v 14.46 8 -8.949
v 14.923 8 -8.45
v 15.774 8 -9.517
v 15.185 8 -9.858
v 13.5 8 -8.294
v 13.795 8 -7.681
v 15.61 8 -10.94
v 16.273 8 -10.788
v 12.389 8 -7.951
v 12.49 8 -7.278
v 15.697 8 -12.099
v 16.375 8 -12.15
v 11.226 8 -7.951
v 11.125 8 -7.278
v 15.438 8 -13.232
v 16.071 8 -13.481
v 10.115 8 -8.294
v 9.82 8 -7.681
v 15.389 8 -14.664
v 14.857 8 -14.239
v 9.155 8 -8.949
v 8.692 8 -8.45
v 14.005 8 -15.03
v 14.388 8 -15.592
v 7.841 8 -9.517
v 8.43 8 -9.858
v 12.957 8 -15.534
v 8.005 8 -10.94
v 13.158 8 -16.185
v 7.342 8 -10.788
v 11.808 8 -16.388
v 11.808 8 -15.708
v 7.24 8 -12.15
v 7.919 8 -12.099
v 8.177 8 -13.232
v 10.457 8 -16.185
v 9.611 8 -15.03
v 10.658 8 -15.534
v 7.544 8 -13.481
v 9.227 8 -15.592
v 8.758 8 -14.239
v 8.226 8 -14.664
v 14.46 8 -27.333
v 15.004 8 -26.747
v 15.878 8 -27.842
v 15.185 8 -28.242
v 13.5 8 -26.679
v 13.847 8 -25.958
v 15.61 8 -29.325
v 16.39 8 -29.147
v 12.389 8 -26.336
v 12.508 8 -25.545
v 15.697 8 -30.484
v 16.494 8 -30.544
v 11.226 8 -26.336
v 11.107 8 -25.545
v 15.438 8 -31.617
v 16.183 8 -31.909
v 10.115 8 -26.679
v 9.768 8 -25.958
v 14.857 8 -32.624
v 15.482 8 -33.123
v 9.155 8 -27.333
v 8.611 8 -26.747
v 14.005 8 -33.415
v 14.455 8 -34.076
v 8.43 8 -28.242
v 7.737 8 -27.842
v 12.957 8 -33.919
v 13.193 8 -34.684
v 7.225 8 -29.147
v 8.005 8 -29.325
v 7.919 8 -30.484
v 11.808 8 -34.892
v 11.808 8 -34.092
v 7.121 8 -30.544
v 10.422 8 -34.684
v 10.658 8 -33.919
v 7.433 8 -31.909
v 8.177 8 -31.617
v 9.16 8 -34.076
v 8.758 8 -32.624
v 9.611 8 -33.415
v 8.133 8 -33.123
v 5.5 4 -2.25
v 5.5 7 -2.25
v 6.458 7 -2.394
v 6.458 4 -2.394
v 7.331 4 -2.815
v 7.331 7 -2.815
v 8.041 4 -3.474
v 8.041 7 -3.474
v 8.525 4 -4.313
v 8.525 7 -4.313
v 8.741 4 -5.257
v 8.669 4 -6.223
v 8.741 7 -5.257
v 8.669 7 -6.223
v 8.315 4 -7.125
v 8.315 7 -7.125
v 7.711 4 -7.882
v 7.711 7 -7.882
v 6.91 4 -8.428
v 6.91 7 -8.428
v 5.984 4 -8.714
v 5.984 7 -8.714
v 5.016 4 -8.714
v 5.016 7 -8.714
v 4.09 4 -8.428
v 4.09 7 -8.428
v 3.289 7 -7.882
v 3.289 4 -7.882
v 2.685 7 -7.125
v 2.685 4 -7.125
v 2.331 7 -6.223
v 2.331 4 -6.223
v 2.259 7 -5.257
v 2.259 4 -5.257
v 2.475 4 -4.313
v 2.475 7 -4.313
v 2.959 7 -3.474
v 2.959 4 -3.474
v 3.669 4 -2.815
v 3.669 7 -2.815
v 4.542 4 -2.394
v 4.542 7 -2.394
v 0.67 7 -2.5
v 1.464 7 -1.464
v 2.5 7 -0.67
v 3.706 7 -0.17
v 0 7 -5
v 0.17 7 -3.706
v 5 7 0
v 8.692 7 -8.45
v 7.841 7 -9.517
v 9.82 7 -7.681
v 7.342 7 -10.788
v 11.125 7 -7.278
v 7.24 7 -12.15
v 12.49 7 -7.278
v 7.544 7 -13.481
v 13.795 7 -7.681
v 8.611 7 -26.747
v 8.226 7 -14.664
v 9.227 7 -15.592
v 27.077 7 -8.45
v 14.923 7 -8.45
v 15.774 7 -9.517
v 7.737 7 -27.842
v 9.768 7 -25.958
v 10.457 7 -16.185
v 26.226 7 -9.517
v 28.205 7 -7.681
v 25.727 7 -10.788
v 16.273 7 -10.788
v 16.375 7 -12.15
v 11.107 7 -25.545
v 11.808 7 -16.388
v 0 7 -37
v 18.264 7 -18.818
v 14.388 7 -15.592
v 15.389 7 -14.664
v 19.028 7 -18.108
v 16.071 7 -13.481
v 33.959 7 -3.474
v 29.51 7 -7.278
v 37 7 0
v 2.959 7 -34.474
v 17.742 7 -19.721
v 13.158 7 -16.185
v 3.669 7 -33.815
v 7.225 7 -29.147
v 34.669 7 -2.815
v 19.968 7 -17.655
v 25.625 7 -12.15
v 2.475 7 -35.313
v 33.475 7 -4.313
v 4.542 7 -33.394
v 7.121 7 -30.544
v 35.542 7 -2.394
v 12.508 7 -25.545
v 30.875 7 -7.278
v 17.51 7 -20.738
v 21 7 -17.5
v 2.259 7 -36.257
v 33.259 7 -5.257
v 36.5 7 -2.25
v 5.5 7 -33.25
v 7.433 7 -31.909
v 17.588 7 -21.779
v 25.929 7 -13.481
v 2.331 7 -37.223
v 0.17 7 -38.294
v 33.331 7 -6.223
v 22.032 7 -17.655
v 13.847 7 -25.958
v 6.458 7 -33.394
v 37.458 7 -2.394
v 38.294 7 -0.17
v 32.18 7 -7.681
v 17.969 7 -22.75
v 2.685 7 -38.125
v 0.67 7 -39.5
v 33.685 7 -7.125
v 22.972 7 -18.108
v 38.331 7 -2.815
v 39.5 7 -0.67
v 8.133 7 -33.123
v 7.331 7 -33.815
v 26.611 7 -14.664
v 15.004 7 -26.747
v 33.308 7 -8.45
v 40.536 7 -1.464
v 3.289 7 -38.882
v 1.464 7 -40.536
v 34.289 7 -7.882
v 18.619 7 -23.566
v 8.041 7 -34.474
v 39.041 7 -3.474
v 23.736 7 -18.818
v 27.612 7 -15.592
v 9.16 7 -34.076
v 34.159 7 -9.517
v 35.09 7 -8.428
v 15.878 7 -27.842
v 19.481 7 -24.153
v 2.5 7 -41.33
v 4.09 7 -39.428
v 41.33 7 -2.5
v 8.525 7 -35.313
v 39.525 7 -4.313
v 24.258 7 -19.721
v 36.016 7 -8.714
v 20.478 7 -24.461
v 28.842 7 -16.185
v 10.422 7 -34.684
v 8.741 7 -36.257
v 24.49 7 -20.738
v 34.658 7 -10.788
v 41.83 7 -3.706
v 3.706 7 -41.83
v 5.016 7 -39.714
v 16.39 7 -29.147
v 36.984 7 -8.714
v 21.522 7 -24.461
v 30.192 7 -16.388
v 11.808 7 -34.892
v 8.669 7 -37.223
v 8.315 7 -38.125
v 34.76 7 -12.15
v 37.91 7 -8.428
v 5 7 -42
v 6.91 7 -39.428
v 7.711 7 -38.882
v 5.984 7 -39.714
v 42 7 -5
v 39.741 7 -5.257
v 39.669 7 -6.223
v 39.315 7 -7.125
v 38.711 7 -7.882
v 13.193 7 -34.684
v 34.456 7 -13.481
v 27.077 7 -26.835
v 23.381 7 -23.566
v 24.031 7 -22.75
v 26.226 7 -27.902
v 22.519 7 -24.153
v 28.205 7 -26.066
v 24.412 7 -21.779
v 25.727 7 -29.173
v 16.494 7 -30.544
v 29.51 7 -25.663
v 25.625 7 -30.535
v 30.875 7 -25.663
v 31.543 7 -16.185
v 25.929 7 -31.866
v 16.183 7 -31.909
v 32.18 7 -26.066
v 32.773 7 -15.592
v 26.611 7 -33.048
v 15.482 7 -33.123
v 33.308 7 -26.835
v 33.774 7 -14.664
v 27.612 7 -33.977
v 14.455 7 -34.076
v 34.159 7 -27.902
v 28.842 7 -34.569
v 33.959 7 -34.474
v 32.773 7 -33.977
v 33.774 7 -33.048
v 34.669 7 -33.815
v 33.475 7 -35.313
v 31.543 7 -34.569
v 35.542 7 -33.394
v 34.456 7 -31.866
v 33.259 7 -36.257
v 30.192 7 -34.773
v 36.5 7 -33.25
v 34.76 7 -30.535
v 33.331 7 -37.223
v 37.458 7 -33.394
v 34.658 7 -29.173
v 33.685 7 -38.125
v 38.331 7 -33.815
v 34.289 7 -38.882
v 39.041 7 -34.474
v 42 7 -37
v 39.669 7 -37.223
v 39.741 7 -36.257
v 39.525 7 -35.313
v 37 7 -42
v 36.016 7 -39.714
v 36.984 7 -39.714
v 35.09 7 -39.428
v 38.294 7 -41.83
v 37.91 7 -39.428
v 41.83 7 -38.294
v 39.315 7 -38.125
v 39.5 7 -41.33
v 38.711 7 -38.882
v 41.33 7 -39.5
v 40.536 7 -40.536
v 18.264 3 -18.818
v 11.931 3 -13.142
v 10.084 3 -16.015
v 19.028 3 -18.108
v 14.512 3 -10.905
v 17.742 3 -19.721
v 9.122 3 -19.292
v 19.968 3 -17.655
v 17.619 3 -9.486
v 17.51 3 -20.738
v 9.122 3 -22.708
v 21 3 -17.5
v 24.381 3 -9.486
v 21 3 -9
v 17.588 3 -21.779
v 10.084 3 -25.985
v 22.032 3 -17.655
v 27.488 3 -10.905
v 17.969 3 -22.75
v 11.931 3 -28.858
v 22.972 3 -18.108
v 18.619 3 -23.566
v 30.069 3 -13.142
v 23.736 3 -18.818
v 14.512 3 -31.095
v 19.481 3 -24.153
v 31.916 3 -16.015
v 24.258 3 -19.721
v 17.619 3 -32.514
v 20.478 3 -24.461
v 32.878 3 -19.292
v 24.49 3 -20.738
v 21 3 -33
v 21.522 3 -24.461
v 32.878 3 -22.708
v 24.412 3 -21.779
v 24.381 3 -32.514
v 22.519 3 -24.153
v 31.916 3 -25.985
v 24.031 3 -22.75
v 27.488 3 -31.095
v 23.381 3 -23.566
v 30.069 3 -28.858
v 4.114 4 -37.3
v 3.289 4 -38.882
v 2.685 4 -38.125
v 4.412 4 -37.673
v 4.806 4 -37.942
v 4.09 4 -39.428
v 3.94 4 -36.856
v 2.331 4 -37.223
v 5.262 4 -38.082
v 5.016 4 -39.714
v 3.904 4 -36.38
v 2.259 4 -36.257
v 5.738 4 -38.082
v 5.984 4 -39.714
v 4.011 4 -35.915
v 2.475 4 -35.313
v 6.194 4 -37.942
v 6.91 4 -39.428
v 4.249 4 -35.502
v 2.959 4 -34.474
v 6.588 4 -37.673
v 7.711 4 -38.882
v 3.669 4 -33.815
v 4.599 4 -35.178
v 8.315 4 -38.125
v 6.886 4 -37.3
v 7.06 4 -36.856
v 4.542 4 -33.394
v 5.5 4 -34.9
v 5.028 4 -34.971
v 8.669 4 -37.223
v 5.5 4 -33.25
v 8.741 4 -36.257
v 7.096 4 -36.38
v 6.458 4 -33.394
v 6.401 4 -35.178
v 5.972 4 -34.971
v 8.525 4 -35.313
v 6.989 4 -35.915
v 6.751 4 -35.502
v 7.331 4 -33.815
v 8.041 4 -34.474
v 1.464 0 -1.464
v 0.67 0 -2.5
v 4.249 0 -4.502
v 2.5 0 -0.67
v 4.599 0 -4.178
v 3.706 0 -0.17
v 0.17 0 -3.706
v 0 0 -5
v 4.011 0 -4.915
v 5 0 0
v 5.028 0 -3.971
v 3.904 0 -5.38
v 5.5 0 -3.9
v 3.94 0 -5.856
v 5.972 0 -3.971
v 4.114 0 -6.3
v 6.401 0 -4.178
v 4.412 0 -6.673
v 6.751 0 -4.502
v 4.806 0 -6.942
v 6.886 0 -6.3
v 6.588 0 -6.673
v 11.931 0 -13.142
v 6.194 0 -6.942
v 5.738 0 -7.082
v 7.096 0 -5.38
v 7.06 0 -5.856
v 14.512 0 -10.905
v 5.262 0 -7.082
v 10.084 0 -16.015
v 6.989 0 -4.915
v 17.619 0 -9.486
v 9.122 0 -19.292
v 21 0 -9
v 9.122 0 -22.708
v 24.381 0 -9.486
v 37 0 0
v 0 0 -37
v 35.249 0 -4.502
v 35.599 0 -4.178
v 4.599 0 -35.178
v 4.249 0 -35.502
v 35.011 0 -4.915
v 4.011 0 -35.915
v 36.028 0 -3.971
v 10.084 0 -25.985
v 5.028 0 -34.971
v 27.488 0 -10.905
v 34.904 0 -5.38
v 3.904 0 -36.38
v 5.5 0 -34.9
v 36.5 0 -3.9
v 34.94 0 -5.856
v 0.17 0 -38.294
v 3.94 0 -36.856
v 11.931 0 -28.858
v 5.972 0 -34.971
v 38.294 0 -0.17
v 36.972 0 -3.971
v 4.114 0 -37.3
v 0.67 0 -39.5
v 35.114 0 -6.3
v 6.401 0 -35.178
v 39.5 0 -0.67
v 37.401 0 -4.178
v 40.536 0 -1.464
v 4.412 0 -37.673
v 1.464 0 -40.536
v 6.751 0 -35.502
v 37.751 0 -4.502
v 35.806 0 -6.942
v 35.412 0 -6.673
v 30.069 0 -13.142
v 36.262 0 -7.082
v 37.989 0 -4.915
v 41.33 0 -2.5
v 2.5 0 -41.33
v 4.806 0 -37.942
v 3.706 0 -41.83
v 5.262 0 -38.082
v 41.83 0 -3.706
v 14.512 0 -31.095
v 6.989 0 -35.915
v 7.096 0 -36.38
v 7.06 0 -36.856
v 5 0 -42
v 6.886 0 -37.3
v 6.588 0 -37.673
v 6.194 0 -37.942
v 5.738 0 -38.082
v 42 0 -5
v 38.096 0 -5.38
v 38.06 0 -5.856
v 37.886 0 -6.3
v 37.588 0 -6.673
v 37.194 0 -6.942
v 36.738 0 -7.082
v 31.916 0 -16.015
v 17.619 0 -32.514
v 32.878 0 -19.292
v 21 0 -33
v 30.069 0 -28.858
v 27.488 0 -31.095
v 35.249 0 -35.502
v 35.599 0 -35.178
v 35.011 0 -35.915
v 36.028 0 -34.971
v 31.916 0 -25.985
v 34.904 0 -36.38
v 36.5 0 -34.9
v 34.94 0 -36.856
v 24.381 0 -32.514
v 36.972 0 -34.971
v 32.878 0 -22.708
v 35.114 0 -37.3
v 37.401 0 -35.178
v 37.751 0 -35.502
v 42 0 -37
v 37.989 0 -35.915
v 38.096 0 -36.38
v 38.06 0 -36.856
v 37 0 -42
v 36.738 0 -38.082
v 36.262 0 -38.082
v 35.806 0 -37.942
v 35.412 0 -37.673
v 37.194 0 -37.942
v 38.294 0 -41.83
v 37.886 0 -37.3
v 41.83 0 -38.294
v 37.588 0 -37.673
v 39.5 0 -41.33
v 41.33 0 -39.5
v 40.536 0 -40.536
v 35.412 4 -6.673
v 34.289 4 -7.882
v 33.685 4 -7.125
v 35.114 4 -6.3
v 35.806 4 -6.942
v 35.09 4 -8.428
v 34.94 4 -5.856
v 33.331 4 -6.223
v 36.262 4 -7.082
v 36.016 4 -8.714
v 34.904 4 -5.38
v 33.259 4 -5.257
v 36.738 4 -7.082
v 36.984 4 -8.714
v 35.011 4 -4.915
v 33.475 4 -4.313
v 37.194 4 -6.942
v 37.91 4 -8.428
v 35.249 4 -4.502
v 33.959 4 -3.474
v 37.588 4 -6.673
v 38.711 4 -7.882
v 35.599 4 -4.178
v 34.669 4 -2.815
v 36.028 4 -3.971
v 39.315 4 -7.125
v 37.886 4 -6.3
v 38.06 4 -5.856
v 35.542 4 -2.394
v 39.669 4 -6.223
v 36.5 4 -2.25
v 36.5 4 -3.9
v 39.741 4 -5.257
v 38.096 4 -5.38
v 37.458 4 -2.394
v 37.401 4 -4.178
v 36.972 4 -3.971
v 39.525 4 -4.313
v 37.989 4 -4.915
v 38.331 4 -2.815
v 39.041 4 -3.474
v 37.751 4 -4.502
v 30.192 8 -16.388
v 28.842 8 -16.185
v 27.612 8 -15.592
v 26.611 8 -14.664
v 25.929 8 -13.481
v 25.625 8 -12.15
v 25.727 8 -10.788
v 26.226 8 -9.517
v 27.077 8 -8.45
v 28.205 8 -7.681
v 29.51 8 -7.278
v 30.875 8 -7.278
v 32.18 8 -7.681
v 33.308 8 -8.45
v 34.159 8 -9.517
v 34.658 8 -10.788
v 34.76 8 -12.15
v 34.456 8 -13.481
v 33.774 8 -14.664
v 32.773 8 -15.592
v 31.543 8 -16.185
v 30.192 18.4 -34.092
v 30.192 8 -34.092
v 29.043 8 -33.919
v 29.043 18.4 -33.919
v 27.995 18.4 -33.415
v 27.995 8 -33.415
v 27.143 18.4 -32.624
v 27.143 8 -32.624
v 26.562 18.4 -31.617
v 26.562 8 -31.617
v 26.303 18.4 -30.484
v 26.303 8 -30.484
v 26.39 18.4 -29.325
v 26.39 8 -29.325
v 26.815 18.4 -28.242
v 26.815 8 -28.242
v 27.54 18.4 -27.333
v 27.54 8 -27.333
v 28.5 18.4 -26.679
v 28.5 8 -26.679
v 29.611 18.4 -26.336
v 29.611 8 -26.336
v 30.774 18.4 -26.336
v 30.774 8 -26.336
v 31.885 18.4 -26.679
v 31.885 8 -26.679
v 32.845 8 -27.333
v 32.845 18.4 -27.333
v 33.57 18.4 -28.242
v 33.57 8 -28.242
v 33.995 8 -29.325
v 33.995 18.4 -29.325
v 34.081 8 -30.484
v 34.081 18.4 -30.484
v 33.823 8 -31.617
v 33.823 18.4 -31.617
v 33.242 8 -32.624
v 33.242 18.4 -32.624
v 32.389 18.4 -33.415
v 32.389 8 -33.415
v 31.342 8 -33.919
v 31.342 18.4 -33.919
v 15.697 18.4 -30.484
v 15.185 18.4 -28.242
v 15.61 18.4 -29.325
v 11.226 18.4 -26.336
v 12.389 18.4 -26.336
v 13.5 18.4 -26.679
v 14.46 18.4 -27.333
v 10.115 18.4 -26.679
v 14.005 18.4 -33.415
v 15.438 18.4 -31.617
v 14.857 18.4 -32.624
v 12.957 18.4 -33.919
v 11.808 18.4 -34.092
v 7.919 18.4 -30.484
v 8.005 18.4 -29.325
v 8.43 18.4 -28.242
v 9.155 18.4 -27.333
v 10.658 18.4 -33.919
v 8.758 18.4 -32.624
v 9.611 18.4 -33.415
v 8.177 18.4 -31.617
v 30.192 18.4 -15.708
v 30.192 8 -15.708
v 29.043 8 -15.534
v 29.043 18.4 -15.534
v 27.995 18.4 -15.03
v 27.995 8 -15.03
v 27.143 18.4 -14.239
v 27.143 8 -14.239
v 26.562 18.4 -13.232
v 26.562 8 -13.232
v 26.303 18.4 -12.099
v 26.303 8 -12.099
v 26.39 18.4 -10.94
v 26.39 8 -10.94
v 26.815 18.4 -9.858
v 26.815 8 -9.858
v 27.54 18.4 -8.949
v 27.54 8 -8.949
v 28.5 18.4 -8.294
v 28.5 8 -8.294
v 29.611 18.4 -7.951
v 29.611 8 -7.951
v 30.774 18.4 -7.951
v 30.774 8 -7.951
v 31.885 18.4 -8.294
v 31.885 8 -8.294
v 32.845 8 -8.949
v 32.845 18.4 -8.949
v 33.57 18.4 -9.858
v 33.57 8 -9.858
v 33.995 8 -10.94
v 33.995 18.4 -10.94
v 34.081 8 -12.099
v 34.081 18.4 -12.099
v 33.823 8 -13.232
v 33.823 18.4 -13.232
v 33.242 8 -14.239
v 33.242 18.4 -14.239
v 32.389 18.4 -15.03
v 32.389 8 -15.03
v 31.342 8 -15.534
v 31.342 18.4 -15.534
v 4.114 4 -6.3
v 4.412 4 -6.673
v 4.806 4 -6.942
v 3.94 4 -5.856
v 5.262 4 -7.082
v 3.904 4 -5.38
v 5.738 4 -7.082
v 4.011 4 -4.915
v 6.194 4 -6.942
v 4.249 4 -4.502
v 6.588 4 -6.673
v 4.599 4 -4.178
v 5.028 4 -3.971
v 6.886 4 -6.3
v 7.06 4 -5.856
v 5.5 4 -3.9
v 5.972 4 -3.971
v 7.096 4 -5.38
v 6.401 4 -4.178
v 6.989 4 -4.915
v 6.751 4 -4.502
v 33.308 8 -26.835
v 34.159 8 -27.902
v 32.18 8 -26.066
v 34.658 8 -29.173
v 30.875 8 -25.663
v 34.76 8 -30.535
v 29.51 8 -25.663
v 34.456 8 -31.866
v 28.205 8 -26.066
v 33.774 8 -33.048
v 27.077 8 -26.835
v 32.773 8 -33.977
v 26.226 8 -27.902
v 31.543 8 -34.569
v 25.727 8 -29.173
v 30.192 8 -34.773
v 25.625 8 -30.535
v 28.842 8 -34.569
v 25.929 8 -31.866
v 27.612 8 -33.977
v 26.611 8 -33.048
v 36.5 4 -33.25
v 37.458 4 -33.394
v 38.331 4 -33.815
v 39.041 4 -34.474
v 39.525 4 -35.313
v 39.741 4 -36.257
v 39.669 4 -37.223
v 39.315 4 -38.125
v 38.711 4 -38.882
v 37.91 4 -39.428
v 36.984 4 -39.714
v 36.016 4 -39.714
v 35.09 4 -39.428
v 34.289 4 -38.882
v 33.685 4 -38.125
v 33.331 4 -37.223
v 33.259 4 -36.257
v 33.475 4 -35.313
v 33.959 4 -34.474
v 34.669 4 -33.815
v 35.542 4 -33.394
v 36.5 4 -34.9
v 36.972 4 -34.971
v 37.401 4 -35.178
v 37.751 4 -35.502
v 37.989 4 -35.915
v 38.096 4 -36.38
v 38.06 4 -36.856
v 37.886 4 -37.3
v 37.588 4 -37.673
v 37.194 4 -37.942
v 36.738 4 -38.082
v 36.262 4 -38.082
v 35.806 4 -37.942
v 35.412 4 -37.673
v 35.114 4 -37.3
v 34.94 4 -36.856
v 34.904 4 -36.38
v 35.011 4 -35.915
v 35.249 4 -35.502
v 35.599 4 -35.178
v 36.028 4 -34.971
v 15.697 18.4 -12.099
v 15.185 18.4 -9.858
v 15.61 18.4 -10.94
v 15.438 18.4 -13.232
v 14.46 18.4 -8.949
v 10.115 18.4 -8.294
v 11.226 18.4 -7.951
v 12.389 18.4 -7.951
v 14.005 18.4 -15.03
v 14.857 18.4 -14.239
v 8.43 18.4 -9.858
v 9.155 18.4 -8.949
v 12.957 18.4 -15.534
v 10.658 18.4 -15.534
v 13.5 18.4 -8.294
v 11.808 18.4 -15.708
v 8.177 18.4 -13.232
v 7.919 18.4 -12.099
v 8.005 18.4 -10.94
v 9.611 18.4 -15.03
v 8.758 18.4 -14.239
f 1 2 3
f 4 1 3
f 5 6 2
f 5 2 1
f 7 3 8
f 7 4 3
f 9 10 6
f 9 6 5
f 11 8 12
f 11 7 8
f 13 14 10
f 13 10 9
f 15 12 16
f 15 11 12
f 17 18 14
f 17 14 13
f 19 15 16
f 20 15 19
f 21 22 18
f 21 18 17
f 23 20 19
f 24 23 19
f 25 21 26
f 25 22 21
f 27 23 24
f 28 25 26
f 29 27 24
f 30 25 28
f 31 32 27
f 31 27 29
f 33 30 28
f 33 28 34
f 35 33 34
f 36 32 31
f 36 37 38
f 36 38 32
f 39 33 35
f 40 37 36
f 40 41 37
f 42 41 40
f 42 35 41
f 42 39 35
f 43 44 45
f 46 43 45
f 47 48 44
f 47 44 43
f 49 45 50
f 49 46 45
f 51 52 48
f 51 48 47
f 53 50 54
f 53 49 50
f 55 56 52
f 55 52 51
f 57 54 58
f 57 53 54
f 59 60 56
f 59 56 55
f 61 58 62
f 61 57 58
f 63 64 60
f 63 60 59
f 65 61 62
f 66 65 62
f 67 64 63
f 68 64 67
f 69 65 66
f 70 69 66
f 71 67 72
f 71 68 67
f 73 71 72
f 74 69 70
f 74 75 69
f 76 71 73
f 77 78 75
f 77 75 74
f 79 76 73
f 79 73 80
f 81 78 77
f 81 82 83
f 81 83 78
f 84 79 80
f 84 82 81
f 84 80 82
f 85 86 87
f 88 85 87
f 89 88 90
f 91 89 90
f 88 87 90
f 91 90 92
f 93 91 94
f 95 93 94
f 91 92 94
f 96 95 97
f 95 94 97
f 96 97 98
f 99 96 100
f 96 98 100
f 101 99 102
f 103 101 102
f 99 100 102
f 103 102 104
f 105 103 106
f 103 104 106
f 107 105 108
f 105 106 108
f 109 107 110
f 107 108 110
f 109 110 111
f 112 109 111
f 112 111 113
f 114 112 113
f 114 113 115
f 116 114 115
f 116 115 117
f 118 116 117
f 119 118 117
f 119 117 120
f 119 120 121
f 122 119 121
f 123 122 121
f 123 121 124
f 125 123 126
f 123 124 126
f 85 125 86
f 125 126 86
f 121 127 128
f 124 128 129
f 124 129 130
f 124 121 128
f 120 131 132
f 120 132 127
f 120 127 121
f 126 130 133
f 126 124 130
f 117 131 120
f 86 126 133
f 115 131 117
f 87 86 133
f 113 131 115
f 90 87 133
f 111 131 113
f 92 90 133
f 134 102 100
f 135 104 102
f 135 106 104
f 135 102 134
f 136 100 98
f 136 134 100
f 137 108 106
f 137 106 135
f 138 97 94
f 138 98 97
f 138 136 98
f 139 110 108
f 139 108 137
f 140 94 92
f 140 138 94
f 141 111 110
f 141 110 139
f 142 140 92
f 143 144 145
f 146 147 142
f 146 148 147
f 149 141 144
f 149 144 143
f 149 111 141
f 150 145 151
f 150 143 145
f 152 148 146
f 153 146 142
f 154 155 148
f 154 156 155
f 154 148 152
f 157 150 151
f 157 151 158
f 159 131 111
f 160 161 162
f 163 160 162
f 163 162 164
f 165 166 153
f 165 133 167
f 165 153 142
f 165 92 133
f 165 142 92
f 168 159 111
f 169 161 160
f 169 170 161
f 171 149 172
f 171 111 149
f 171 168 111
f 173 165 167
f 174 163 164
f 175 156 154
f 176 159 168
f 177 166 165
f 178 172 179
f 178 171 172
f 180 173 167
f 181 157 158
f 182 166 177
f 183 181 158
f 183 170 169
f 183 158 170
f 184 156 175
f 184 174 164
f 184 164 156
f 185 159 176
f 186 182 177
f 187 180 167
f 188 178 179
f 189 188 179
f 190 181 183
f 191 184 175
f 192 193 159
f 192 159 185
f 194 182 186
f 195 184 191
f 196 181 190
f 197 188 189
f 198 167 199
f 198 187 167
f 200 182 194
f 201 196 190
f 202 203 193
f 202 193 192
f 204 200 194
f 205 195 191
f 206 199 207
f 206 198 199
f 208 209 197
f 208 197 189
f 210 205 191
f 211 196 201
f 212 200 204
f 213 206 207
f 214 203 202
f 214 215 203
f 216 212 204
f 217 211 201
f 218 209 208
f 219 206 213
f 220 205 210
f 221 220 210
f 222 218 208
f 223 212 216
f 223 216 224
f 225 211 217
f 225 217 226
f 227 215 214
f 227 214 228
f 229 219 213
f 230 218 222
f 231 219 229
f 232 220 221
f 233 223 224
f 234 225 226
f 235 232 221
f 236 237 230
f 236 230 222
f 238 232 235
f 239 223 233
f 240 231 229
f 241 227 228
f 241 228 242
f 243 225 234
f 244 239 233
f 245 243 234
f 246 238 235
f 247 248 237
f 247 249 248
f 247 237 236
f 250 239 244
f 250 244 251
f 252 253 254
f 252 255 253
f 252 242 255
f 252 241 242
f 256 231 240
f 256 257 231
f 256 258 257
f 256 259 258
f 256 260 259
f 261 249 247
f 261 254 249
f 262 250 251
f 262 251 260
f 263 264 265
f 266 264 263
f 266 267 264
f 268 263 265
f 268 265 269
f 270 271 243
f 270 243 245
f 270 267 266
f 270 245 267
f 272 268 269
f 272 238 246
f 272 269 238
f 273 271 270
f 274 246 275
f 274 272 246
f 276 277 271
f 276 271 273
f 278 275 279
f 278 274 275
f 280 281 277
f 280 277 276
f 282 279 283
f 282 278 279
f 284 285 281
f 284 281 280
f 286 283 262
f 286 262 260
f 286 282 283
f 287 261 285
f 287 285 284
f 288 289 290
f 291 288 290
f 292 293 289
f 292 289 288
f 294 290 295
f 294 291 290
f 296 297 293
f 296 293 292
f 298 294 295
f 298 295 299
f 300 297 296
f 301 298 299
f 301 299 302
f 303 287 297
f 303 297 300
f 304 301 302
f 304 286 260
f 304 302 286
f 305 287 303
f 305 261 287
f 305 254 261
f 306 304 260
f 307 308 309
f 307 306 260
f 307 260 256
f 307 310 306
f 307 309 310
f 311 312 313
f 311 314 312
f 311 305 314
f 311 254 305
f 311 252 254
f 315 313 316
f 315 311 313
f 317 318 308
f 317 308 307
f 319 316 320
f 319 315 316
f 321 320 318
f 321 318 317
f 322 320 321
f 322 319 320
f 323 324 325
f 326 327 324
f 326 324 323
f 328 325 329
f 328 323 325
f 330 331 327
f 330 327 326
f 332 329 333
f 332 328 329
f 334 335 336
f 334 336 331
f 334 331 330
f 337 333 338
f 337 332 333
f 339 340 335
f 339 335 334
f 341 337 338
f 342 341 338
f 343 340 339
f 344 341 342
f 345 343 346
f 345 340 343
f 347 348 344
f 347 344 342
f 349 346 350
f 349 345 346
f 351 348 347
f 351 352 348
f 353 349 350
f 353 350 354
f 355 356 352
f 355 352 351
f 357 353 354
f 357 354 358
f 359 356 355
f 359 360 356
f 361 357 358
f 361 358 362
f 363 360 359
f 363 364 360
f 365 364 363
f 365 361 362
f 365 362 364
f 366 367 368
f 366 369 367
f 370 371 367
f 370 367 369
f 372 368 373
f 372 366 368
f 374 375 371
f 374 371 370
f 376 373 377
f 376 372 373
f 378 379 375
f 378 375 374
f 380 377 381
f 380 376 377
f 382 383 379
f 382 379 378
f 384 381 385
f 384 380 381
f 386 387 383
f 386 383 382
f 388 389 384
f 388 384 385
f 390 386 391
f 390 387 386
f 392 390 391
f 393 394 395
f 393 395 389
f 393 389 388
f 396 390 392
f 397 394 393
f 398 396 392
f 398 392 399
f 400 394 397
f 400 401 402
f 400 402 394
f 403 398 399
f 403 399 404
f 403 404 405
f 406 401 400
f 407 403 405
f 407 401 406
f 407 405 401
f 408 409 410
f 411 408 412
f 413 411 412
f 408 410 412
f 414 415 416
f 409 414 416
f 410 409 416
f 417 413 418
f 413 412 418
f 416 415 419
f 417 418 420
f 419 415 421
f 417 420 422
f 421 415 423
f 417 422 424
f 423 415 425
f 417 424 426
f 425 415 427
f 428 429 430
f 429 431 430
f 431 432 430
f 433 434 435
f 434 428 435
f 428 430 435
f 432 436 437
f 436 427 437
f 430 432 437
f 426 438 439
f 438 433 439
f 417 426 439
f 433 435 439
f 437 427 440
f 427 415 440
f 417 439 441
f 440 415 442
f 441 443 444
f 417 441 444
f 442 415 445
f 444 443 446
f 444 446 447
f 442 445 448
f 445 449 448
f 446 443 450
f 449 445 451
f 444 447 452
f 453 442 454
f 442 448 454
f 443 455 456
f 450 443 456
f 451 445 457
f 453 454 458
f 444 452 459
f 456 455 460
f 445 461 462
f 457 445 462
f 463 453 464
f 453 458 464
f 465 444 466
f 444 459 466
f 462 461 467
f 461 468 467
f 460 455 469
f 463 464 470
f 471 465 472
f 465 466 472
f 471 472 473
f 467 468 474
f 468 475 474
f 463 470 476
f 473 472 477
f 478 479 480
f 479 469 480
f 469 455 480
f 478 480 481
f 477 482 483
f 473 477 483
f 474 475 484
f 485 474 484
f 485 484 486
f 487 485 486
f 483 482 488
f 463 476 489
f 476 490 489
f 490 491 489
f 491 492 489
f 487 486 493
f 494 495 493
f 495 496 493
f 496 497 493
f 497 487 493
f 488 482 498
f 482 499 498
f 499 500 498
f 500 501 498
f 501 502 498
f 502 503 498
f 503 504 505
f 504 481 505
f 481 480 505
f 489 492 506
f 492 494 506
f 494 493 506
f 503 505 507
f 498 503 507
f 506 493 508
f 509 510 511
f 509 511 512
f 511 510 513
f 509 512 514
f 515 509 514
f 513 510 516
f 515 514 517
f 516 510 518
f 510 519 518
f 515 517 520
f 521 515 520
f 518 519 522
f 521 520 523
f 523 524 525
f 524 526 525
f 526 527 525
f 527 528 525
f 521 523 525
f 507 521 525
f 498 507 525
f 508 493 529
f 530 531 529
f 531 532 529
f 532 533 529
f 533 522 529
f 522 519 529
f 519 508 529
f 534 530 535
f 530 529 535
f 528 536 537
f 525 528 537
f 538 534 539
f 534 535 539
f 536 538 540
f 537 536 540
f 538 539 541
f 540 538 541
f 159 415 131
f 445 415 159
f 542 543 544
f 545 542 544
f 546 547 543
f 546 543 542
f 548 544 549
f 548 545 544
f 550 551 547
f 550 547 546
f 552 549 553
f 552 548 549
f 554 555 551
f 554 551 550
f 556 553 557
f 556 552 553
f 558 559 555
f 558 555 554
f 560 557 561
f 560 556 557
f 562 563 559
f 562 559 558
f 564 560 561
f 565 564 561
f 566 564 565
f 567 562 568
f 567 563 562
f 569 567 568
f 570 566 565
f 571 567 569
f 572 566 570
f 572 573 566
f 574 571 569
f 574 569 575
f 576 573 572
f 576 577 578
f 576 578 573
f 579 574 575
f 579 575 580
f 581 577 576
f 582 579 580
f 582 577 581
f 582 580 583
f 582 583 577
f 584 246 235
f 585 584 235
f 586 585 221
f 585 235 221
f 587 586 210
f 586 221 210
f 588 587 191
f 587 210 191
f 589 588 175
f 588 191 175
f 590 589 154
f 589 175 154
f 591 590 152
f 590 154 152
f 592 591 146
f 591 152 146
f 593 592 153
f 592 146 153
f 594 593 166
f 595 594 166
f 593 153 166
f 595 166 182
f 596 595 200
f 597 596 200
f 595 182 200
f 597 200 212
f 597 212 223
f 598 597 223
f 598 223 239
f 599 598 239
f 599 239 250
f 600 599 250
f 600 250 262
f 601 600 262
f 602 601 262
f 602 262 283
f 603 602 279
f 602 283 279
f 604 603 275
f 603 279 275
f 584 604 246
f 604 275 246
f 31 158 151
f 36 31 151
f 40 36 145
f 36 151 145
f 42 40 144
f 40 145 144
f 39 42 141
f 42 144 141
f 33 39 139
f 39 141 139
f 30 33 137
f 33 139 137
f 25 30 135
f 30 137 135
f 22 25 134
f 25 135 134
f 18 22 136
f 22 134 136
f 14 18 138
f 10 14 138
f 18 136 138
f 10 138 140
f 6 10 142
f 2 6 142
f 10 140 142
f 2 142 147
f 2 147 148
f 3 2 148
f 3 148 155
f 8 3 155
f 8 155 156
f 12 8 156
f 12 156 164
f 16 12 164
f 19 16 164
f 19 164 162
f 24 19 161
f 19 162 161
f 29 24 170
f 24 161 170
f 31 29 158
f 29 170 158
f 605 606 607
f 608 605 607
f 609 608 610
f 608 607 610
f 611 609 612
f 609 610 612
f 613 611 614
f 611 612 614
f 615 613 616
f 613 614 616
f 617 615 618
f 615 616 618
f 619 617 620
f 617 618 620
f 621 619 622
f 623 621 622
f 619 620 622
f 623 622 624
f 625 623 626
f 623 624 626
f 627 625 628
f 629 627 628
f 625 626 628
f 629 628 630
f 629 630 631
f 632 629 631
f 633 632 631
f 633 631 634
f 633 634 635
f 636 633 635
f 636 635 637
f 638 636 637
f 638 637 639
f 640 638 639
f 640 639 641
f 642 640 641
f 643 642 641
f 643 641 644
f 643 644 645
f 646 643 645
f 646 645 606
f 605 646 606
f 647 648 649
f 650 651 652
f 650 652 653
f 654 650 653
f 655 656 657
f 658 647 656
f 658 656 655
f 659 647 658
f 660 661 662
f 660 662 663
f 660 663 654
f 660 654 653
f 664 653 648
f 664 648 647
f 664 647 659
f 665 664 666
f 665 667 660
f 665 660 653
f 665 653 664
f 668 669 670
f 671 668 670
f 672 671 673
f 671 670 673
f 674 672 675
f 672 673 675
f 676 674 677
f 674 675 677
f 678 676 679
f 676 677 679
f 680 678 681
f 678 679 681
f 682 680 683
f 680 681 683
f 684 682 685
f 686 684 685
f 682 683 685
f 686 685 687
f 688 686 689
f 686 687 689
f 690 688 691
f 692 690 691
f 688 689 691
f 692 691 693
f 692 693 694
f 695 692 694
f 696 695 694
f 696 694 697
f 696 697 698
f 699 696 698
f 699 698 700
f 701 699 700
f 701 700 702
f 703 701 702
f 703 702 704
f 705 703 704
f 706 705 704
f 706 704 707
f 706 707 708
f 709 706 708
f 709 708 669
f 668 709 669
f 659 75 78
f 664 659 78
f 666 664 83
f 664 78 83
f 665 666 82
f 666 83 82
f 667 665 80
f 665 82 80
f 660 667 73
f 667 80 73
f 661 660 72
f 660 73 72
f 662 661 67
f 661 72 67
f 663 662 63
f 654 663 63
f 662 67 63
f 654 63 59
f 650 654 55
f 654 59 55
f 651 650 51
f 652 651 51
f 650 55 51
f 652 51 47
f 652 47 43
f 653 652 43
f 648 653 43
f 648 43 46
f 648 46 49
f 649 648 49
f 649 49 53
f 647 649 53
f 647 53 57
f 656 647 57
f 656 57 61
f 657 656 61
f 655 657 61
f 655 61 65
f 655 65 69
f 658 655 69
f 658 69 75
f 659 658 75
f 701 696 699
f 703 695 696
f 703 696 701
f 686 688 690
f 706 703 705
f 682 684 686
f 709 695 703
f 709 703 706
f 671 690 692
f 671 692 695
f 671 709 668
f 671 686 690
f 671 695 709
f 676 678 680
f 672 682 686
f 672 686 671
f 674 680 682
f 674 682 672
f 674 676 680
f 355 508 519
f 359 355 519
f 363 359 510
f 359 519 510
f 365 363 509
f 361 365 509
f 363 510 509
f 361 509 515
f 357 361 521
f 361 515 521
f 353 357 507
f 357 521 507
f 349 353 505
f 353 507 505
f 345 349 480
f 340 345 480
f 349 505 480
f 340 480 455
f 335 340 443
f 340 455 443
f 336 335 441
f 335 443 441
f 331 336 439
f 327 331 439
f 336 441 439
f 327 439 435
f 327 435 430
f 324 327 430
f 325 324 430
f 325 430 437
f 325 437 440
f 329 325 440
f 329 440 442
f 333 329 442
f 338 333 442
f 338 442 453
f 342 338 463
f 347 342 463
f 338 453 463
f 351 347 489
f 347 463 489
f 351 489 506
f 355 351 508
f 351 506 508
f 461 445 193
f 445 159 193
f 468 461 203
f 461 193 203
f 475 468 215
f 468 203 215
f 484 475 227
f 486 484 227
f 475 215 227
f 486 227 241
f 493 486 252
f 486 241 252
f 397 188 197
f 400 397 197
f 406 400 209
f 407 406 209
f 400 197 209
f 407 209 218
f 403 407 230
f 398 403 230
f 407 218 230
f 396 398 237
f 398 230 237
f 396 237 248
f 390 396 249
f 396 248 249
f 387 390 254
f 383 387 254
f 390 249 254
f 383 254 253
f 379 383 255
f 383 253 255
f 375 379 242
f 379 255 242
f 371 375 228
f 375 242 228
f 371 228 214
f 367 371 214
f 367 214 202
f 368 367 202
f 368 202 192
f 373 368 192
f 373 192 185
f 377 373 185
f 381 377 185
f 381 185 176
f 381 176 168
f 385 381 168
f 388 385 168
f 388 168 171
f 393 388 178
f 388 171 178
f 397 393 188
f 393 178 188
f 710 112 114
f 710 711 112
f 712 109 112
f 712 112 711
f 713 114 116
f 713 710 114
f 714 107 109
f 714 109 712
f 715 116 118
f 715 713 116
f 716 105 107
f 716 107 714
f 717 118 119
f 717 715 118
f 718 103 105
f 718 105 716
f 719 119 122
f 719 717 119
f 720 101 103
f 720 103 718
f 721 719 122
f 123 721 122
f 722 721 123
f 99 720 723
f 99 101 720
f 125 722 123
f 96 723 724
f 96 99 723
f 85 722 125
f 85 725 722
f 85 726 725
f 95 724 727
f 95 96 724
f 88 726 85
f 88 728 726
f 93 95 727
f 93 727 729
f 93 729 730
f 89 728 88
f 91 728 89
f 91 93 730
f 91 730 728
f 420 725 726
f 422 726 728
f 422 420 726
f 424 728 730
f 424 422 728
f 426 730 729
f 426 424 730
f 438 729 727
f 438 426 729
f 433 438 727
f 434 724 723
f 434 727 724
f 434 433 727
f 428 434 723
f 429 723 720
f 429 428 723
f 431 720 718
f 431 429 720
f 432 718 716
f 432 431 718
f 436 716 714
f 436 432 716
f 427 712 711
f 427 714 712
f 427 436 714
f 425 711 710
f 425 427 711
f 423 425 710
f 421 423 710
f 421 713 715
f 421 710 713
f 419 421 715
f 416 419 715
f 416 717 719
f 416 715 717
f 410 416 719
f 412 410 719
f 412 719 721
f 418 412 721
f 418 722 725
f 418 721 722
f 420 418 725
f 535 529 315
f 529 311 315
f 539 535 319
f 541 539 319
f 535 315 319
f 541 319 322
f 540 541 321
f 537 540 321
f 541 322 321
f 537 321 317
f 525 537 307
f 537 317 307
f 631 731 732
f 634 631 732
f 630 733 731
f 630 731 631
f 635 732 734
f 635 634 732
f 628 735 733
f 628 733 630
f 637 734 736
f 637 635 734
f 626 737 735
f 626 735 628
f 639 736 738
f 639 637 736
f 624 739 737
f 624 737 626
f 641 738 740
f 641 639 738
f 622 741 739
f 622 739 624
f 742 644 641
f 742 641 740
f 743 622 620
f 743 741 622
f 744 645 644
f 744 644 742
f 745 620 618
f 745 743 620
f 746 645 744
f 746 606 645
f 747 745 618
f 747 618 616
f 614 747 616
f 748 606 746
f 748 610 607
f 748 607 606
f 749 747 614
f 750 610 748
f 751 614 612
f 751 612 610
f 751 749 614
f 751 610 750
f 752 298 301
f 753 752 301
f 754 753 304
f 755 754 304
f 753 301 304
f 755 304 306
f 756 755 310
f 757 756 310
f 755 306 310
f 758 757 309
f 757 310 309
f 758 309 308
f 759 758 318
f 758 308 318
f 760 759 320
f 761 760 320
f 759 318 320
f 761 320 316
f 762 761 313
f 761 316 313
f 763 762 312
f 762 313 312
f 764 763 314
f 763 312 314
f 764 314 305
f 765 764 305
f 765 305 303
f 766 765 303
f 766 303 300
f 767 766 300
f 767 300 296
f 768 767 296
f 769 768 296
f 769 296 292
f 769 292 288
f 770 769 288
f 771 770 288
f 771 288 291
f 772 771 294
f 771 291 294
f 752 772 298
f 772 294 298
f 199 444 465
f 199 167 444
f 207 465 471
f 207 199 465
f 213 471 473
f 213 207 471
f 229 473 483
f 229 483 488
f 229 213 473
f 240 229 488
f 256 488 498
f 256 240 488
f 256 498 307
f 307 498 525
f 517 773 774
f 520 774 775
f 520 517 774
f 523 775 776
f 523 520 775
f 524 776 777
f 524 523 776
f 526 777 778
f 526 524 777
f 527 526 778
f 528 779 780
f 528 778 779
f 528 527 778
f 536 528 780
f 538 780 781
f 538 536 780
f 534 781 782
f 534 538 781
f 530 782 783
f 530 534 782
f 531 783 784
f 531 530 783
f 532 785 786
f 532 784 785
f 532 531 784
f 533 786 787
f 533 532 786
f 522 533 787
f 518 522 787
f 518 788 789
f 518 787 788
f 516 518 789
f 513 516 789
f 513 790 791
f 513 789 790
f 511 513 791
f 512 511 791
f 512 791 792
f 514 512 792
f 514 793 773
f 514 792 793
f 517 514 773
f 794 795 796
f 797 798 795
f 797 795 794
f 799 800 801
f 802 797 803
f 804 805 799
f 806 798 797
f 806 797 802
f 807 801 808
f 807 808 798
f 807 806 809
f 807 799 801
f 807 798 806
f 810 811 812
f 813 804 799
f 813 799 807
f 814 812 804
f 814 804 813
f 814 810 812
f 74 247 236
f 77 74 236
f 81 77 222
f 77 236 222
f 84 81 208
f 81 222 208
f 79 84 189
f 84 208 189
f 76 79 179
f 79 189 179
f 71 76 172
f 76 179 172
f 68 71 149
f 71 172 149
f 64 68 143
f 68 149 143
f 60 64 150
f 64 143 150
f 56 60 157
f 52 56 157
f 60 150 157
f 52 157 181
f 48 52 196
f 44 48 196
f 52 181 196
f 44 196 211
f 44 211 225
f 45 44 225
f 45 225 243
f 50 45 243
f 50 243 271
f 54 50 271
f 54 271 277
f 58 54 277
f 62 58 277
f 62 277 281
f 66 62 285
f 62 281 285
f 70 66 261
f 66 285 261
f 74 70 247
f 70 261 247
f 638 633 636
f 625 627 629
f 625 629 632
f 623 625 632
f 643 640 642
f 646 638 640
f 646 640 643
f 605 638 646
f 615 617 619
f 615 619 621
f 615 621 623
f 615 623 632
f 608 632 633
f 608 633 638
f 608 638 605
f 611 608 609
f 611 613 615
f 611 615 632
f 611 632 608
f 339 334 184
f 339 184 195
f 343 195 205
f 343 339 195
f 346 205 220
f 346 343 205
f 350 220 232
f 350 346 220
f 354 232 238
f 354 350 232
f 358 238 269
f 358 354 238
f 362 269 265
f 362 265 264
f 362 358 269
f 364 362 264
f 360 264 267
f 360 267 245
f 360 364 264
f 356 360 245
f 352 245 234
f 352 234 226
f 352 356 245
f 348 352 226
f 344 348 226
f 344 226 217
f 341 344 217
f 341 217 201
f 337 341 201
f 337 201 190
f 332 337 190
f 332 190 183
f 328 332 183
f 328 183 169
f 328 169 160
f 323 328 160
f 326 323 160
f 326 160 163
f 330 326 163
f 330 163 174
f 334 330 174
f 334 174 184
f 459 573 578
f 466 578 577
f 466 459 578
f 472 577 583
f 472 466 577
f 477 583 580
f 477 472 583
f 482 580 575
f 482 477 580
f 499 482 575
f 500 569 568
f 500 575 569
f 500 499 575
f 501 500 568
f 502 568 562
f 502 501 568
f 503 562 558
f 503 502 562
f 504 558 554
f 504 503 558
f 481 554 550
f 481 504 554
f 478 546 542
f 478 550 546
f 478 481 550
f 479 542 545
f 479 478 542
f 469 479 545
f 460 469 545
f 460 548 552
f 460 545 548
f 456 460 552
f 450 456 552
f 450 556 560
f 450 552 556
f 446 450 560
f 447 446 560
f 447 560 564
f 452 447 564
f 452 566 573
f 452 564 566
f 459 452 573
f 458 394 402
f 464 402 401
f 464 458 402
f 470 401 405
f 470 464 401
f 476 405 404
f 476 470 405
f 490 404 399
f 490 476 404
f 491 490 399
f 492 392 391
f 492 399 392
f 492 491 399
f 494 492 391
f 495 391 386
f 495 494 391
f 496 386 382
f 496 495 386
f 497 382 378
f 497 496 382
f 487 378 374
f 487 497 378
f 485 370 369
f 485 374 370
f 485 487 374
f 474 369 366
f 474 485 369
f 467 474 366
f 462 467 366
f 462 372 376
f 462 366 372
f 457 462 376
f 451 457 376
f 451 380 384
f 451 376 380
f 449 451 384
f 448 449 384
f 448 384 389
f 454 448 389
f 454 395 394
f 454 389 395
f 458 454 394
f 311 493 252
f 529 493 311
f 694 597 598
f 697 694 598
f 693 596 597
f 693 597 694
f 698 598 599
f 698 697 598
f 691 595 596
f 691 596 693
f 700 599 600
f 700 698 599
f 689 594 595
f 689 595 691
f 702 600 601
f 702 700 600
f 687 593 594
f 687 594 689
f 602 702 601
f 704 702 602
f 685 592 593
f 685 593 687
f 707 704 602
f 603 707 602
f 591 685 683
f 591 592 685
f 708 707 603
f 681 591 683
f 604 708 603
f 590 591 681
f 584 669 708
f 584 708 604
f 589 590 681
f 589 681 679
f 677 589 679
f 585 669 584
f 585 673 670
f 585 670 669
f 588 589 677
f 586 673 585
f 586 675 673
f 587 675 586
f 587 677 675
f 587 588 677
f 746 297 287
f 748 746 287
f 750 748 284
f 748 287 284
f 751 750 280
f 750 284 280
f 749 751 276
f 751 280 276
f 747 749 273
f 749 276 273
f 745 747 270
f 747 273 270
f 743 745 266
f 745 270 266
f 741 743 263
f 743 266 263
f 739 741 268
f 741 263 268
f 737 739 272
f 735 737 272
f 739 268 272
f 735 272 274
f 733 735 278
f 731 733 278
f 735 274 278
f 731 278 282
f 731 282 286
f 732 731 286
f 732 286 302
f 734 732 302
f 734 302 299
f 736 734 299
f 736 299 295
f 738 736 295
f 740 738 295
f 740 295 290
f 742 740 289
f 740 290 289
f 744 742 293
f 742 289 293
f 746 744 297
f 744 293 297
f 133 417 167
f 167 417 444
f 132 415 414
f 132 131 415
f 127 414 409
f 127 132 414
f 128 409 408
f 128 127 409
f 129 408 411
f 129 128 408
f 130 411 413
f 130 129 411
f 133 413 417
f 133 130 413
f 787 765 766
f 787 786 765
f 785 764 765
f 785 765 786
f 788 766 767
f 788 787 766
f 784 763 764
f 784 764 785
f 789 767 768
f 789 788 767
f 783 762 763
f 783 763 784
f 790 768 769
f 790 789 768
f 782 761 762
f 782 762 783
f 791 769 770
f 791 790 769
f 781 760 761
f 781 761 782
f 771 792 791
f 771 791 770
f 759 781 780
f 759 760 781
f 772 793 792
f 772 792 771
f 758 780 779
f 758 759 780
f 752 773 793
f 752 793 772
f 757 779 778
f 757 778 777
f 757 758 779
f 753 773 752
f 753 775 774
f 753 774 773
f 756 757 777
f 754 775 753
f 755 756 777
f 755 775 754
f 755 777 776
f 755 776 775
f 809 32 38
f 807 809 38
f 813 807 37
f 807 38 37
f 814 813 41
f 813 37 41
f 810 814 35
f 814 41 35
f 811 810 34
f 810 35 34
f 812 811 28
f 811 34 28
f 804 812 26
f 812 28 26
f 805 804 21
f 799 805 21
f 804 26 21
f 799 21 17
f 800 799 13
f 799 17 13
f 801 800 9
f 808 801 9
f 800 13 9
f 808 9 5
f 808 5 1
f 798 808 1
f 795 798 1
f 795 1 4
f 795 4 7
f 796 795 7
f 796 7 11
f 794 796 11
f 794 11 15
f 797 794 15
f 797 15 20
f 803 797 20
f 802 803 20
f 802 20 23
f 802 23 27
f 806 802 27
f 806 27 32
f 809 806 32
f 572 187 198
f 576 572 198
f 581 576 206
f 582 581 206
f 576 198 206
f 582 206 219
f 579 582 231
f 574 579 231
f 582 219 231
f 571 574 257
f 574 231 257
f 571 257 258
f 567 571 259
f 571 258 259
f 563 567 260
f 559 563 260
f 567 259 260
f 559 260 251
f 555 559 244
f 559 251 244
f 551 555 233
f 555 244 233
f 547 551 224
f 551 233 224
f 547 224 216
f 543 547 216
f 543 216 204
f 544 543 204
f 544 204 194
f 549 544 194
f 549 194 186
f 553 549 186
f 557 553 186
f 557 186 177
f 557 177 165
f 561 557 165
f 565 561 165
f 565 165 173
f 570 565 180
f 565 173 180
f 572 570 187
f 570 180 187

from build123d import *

# Parameters (mm, degrees)
SKIZZE1_W                       = 42
SKIZZE1_H                       = 42
SKIZZE1_R                       = 1.6
SKIZZE1_R_2                     = 3.5
AUFSATZ_LINEAR_AUSTRAGEN1_DEPTH = 7
SKIZZE2_R                       = 3.9
AUFSATZ_LINEAR_AUSTRAGEN2_DEPTH = 11.4
VERRUNDUNG1_R                   = 5
SKIZZE3_R                       = 12
SCHNITT_LINEAR_AUSTRAGEN1_DEPTH = 3
SKIZZE4_R                       = 3.25
SCHNITT_LINEAR_AUSTRAGEN2_DEPTH = 3
SKIZZE5_R                       = 4.7
SKIZZE5_R_2                     = 4.580495264
AUFSATZ_LINEAR_AUSTRAGEN3_DEPTH = 1


with BuildPart() as part:
    # Skizze1 → Aufsatz-Linear austragen1 (new body)
    with BuildSketch(Plane(origin=(0, 0, 0), x_dir=(1, 0, 0), z_dir=(0, 1, 0))):
        with Locations((21, 21)):
            Rectangle(SKIZZE1_W, SKIZZE1_H)
        with Locations(Location((5.5, 36.5, 0), (0, 0, 270))):
            Circle(SKIZZE1_R, mode=Mode.SUBTRACT)
        with Locations(Location((36.5, 36.5, 0), (0, 0, 270))):
            Circle(SKIZZE1_R, mode=Mode.SUBTRACT)
        with Locations(Location((5.5, 5.5, 0), (0, 0, 270))):
            Circle(SKIZZE1_R, mode=Mode.SUBTRACT)
        with Locations(Location((36.5, 5.5, 0), (0, 0, 270))):
            Circle(SKIZZE1_R, mode=Mode.SUBTRACT)
        with Locations(Location((21, 21, 0), (0, 0, 270))):
            Circle(SKIZZE1_R_2, mode=Mode.SUBTRACT)
    extrude(amount=AUFSATZ_LINEAR_AUSTRAGEN1_DEPTH)

    # Skizze2 → Aufsatz-Linear austragen2 (add)
    with BuildSketch(Plane(origin=(0, 7, 0), x_dir=(1, 0, 0), z_dir=(0, 1, 0))):
        with Locations(Location((11.807611845, 30.192388155, 0), (0, 0, 90))):
            Circle(SKIZZE2_R)
        with Locations(Location((30.192388155, 30.192388155, 0), (0, 0, 90))):
            Circle(SKIZZE2_R)
        with Locations(Location((30.192388155, 11.807611845, 0), (0, 0, 90))):
            Circle(SKIZZE2_R)
        with Locations(Location((11.807611845, 11.807611845, 0), (0, 0, 90))):
            Circle(SKIZZE2_R)
    extrude(amount=AUFSATZ_LINEAR_AUSTRAGEN2_DEPTH)

    # Verrundung1
    verrundung1_edges = [part.edges().sort_by_distance(p)[0] for p in [
        (0, 3.5, -42),
        (42, 3.5, -42),
        (42, 3.5, 0),
        (0, 3.5, 0),
    ]]
    fillet(verrundung1_edges, radius=VERRUNDUNG1_R)

    # Skizze3 → Schnitt-Linear austragen1 (cut)
    with BuildSketch(Plane.XZ):
        with Locations(Location((21, -21, 0), (0, 0, 270))):
            Circle(SKIZZE3_R)
    extrude(amount=-SCHNITT_LINEAR_AUSTRAGEN1_DEPTH, mode=Mode.SUBTRACT)

    # Skizze4 → Schnitt-Linear austragen2 (cut)
    with BuildSketch(Plane(origin=(0, 7, 0), x_dir=(1, 0, 0), z_dir=(0, 1, 0))):
        with Locations(Location((5.5, 36.5, 0), (0, 0, 270))):
            Circle(SKIZZE4_R)
        with Locations(Location((36.5, 36.5, 0), (0, 0, 270))):
            Circle(SKIZZE4_R)
        with Locations(Location((5.5, 5.5, 0), (0, 0, 270))):
            Circle(SKIZZE4_R)
        with Locations(Location((36.5, 5.5, 0), (0, 0, 270))):
            Circle(SKIZZE4_R)
    extrude(amount=-SCHNITT_LINEAR_AUSTRAGEN2_DEPTH, mode=Mode.SUBTRACT)

    # Skizze5 → Aufsatz-Linear austragen3 (add)
    with BuildSketch(Plane(origin=(0, 7, 0), x_dir=(1, 0, 0), z_dir=(0, 1, 0))):
        with Locations(Location((11.807611845, 30.192388155, 0), (0, 0, 90))):
            Circle(SKIZZE5_R)
        with Locations(Location((11.807611845, 11.807611845, 0), (0, 0, 90))):
            Circle(SKIZZE5_R_2)
        with Locations(Location((30.192388155, 11.807611845, 0), (0, 0, 90))):
            Circle(SKIZZE5_R_2)
        with Locations(Location((30.192388155, 30.192388155, 0), (0, 0, 90))):
            Circle(SKIZZE5_R_2)
    extrude(amount=AUFSATZ_LINEAR_AUSTRAGEN3_DEPTH)


solid = part.part
